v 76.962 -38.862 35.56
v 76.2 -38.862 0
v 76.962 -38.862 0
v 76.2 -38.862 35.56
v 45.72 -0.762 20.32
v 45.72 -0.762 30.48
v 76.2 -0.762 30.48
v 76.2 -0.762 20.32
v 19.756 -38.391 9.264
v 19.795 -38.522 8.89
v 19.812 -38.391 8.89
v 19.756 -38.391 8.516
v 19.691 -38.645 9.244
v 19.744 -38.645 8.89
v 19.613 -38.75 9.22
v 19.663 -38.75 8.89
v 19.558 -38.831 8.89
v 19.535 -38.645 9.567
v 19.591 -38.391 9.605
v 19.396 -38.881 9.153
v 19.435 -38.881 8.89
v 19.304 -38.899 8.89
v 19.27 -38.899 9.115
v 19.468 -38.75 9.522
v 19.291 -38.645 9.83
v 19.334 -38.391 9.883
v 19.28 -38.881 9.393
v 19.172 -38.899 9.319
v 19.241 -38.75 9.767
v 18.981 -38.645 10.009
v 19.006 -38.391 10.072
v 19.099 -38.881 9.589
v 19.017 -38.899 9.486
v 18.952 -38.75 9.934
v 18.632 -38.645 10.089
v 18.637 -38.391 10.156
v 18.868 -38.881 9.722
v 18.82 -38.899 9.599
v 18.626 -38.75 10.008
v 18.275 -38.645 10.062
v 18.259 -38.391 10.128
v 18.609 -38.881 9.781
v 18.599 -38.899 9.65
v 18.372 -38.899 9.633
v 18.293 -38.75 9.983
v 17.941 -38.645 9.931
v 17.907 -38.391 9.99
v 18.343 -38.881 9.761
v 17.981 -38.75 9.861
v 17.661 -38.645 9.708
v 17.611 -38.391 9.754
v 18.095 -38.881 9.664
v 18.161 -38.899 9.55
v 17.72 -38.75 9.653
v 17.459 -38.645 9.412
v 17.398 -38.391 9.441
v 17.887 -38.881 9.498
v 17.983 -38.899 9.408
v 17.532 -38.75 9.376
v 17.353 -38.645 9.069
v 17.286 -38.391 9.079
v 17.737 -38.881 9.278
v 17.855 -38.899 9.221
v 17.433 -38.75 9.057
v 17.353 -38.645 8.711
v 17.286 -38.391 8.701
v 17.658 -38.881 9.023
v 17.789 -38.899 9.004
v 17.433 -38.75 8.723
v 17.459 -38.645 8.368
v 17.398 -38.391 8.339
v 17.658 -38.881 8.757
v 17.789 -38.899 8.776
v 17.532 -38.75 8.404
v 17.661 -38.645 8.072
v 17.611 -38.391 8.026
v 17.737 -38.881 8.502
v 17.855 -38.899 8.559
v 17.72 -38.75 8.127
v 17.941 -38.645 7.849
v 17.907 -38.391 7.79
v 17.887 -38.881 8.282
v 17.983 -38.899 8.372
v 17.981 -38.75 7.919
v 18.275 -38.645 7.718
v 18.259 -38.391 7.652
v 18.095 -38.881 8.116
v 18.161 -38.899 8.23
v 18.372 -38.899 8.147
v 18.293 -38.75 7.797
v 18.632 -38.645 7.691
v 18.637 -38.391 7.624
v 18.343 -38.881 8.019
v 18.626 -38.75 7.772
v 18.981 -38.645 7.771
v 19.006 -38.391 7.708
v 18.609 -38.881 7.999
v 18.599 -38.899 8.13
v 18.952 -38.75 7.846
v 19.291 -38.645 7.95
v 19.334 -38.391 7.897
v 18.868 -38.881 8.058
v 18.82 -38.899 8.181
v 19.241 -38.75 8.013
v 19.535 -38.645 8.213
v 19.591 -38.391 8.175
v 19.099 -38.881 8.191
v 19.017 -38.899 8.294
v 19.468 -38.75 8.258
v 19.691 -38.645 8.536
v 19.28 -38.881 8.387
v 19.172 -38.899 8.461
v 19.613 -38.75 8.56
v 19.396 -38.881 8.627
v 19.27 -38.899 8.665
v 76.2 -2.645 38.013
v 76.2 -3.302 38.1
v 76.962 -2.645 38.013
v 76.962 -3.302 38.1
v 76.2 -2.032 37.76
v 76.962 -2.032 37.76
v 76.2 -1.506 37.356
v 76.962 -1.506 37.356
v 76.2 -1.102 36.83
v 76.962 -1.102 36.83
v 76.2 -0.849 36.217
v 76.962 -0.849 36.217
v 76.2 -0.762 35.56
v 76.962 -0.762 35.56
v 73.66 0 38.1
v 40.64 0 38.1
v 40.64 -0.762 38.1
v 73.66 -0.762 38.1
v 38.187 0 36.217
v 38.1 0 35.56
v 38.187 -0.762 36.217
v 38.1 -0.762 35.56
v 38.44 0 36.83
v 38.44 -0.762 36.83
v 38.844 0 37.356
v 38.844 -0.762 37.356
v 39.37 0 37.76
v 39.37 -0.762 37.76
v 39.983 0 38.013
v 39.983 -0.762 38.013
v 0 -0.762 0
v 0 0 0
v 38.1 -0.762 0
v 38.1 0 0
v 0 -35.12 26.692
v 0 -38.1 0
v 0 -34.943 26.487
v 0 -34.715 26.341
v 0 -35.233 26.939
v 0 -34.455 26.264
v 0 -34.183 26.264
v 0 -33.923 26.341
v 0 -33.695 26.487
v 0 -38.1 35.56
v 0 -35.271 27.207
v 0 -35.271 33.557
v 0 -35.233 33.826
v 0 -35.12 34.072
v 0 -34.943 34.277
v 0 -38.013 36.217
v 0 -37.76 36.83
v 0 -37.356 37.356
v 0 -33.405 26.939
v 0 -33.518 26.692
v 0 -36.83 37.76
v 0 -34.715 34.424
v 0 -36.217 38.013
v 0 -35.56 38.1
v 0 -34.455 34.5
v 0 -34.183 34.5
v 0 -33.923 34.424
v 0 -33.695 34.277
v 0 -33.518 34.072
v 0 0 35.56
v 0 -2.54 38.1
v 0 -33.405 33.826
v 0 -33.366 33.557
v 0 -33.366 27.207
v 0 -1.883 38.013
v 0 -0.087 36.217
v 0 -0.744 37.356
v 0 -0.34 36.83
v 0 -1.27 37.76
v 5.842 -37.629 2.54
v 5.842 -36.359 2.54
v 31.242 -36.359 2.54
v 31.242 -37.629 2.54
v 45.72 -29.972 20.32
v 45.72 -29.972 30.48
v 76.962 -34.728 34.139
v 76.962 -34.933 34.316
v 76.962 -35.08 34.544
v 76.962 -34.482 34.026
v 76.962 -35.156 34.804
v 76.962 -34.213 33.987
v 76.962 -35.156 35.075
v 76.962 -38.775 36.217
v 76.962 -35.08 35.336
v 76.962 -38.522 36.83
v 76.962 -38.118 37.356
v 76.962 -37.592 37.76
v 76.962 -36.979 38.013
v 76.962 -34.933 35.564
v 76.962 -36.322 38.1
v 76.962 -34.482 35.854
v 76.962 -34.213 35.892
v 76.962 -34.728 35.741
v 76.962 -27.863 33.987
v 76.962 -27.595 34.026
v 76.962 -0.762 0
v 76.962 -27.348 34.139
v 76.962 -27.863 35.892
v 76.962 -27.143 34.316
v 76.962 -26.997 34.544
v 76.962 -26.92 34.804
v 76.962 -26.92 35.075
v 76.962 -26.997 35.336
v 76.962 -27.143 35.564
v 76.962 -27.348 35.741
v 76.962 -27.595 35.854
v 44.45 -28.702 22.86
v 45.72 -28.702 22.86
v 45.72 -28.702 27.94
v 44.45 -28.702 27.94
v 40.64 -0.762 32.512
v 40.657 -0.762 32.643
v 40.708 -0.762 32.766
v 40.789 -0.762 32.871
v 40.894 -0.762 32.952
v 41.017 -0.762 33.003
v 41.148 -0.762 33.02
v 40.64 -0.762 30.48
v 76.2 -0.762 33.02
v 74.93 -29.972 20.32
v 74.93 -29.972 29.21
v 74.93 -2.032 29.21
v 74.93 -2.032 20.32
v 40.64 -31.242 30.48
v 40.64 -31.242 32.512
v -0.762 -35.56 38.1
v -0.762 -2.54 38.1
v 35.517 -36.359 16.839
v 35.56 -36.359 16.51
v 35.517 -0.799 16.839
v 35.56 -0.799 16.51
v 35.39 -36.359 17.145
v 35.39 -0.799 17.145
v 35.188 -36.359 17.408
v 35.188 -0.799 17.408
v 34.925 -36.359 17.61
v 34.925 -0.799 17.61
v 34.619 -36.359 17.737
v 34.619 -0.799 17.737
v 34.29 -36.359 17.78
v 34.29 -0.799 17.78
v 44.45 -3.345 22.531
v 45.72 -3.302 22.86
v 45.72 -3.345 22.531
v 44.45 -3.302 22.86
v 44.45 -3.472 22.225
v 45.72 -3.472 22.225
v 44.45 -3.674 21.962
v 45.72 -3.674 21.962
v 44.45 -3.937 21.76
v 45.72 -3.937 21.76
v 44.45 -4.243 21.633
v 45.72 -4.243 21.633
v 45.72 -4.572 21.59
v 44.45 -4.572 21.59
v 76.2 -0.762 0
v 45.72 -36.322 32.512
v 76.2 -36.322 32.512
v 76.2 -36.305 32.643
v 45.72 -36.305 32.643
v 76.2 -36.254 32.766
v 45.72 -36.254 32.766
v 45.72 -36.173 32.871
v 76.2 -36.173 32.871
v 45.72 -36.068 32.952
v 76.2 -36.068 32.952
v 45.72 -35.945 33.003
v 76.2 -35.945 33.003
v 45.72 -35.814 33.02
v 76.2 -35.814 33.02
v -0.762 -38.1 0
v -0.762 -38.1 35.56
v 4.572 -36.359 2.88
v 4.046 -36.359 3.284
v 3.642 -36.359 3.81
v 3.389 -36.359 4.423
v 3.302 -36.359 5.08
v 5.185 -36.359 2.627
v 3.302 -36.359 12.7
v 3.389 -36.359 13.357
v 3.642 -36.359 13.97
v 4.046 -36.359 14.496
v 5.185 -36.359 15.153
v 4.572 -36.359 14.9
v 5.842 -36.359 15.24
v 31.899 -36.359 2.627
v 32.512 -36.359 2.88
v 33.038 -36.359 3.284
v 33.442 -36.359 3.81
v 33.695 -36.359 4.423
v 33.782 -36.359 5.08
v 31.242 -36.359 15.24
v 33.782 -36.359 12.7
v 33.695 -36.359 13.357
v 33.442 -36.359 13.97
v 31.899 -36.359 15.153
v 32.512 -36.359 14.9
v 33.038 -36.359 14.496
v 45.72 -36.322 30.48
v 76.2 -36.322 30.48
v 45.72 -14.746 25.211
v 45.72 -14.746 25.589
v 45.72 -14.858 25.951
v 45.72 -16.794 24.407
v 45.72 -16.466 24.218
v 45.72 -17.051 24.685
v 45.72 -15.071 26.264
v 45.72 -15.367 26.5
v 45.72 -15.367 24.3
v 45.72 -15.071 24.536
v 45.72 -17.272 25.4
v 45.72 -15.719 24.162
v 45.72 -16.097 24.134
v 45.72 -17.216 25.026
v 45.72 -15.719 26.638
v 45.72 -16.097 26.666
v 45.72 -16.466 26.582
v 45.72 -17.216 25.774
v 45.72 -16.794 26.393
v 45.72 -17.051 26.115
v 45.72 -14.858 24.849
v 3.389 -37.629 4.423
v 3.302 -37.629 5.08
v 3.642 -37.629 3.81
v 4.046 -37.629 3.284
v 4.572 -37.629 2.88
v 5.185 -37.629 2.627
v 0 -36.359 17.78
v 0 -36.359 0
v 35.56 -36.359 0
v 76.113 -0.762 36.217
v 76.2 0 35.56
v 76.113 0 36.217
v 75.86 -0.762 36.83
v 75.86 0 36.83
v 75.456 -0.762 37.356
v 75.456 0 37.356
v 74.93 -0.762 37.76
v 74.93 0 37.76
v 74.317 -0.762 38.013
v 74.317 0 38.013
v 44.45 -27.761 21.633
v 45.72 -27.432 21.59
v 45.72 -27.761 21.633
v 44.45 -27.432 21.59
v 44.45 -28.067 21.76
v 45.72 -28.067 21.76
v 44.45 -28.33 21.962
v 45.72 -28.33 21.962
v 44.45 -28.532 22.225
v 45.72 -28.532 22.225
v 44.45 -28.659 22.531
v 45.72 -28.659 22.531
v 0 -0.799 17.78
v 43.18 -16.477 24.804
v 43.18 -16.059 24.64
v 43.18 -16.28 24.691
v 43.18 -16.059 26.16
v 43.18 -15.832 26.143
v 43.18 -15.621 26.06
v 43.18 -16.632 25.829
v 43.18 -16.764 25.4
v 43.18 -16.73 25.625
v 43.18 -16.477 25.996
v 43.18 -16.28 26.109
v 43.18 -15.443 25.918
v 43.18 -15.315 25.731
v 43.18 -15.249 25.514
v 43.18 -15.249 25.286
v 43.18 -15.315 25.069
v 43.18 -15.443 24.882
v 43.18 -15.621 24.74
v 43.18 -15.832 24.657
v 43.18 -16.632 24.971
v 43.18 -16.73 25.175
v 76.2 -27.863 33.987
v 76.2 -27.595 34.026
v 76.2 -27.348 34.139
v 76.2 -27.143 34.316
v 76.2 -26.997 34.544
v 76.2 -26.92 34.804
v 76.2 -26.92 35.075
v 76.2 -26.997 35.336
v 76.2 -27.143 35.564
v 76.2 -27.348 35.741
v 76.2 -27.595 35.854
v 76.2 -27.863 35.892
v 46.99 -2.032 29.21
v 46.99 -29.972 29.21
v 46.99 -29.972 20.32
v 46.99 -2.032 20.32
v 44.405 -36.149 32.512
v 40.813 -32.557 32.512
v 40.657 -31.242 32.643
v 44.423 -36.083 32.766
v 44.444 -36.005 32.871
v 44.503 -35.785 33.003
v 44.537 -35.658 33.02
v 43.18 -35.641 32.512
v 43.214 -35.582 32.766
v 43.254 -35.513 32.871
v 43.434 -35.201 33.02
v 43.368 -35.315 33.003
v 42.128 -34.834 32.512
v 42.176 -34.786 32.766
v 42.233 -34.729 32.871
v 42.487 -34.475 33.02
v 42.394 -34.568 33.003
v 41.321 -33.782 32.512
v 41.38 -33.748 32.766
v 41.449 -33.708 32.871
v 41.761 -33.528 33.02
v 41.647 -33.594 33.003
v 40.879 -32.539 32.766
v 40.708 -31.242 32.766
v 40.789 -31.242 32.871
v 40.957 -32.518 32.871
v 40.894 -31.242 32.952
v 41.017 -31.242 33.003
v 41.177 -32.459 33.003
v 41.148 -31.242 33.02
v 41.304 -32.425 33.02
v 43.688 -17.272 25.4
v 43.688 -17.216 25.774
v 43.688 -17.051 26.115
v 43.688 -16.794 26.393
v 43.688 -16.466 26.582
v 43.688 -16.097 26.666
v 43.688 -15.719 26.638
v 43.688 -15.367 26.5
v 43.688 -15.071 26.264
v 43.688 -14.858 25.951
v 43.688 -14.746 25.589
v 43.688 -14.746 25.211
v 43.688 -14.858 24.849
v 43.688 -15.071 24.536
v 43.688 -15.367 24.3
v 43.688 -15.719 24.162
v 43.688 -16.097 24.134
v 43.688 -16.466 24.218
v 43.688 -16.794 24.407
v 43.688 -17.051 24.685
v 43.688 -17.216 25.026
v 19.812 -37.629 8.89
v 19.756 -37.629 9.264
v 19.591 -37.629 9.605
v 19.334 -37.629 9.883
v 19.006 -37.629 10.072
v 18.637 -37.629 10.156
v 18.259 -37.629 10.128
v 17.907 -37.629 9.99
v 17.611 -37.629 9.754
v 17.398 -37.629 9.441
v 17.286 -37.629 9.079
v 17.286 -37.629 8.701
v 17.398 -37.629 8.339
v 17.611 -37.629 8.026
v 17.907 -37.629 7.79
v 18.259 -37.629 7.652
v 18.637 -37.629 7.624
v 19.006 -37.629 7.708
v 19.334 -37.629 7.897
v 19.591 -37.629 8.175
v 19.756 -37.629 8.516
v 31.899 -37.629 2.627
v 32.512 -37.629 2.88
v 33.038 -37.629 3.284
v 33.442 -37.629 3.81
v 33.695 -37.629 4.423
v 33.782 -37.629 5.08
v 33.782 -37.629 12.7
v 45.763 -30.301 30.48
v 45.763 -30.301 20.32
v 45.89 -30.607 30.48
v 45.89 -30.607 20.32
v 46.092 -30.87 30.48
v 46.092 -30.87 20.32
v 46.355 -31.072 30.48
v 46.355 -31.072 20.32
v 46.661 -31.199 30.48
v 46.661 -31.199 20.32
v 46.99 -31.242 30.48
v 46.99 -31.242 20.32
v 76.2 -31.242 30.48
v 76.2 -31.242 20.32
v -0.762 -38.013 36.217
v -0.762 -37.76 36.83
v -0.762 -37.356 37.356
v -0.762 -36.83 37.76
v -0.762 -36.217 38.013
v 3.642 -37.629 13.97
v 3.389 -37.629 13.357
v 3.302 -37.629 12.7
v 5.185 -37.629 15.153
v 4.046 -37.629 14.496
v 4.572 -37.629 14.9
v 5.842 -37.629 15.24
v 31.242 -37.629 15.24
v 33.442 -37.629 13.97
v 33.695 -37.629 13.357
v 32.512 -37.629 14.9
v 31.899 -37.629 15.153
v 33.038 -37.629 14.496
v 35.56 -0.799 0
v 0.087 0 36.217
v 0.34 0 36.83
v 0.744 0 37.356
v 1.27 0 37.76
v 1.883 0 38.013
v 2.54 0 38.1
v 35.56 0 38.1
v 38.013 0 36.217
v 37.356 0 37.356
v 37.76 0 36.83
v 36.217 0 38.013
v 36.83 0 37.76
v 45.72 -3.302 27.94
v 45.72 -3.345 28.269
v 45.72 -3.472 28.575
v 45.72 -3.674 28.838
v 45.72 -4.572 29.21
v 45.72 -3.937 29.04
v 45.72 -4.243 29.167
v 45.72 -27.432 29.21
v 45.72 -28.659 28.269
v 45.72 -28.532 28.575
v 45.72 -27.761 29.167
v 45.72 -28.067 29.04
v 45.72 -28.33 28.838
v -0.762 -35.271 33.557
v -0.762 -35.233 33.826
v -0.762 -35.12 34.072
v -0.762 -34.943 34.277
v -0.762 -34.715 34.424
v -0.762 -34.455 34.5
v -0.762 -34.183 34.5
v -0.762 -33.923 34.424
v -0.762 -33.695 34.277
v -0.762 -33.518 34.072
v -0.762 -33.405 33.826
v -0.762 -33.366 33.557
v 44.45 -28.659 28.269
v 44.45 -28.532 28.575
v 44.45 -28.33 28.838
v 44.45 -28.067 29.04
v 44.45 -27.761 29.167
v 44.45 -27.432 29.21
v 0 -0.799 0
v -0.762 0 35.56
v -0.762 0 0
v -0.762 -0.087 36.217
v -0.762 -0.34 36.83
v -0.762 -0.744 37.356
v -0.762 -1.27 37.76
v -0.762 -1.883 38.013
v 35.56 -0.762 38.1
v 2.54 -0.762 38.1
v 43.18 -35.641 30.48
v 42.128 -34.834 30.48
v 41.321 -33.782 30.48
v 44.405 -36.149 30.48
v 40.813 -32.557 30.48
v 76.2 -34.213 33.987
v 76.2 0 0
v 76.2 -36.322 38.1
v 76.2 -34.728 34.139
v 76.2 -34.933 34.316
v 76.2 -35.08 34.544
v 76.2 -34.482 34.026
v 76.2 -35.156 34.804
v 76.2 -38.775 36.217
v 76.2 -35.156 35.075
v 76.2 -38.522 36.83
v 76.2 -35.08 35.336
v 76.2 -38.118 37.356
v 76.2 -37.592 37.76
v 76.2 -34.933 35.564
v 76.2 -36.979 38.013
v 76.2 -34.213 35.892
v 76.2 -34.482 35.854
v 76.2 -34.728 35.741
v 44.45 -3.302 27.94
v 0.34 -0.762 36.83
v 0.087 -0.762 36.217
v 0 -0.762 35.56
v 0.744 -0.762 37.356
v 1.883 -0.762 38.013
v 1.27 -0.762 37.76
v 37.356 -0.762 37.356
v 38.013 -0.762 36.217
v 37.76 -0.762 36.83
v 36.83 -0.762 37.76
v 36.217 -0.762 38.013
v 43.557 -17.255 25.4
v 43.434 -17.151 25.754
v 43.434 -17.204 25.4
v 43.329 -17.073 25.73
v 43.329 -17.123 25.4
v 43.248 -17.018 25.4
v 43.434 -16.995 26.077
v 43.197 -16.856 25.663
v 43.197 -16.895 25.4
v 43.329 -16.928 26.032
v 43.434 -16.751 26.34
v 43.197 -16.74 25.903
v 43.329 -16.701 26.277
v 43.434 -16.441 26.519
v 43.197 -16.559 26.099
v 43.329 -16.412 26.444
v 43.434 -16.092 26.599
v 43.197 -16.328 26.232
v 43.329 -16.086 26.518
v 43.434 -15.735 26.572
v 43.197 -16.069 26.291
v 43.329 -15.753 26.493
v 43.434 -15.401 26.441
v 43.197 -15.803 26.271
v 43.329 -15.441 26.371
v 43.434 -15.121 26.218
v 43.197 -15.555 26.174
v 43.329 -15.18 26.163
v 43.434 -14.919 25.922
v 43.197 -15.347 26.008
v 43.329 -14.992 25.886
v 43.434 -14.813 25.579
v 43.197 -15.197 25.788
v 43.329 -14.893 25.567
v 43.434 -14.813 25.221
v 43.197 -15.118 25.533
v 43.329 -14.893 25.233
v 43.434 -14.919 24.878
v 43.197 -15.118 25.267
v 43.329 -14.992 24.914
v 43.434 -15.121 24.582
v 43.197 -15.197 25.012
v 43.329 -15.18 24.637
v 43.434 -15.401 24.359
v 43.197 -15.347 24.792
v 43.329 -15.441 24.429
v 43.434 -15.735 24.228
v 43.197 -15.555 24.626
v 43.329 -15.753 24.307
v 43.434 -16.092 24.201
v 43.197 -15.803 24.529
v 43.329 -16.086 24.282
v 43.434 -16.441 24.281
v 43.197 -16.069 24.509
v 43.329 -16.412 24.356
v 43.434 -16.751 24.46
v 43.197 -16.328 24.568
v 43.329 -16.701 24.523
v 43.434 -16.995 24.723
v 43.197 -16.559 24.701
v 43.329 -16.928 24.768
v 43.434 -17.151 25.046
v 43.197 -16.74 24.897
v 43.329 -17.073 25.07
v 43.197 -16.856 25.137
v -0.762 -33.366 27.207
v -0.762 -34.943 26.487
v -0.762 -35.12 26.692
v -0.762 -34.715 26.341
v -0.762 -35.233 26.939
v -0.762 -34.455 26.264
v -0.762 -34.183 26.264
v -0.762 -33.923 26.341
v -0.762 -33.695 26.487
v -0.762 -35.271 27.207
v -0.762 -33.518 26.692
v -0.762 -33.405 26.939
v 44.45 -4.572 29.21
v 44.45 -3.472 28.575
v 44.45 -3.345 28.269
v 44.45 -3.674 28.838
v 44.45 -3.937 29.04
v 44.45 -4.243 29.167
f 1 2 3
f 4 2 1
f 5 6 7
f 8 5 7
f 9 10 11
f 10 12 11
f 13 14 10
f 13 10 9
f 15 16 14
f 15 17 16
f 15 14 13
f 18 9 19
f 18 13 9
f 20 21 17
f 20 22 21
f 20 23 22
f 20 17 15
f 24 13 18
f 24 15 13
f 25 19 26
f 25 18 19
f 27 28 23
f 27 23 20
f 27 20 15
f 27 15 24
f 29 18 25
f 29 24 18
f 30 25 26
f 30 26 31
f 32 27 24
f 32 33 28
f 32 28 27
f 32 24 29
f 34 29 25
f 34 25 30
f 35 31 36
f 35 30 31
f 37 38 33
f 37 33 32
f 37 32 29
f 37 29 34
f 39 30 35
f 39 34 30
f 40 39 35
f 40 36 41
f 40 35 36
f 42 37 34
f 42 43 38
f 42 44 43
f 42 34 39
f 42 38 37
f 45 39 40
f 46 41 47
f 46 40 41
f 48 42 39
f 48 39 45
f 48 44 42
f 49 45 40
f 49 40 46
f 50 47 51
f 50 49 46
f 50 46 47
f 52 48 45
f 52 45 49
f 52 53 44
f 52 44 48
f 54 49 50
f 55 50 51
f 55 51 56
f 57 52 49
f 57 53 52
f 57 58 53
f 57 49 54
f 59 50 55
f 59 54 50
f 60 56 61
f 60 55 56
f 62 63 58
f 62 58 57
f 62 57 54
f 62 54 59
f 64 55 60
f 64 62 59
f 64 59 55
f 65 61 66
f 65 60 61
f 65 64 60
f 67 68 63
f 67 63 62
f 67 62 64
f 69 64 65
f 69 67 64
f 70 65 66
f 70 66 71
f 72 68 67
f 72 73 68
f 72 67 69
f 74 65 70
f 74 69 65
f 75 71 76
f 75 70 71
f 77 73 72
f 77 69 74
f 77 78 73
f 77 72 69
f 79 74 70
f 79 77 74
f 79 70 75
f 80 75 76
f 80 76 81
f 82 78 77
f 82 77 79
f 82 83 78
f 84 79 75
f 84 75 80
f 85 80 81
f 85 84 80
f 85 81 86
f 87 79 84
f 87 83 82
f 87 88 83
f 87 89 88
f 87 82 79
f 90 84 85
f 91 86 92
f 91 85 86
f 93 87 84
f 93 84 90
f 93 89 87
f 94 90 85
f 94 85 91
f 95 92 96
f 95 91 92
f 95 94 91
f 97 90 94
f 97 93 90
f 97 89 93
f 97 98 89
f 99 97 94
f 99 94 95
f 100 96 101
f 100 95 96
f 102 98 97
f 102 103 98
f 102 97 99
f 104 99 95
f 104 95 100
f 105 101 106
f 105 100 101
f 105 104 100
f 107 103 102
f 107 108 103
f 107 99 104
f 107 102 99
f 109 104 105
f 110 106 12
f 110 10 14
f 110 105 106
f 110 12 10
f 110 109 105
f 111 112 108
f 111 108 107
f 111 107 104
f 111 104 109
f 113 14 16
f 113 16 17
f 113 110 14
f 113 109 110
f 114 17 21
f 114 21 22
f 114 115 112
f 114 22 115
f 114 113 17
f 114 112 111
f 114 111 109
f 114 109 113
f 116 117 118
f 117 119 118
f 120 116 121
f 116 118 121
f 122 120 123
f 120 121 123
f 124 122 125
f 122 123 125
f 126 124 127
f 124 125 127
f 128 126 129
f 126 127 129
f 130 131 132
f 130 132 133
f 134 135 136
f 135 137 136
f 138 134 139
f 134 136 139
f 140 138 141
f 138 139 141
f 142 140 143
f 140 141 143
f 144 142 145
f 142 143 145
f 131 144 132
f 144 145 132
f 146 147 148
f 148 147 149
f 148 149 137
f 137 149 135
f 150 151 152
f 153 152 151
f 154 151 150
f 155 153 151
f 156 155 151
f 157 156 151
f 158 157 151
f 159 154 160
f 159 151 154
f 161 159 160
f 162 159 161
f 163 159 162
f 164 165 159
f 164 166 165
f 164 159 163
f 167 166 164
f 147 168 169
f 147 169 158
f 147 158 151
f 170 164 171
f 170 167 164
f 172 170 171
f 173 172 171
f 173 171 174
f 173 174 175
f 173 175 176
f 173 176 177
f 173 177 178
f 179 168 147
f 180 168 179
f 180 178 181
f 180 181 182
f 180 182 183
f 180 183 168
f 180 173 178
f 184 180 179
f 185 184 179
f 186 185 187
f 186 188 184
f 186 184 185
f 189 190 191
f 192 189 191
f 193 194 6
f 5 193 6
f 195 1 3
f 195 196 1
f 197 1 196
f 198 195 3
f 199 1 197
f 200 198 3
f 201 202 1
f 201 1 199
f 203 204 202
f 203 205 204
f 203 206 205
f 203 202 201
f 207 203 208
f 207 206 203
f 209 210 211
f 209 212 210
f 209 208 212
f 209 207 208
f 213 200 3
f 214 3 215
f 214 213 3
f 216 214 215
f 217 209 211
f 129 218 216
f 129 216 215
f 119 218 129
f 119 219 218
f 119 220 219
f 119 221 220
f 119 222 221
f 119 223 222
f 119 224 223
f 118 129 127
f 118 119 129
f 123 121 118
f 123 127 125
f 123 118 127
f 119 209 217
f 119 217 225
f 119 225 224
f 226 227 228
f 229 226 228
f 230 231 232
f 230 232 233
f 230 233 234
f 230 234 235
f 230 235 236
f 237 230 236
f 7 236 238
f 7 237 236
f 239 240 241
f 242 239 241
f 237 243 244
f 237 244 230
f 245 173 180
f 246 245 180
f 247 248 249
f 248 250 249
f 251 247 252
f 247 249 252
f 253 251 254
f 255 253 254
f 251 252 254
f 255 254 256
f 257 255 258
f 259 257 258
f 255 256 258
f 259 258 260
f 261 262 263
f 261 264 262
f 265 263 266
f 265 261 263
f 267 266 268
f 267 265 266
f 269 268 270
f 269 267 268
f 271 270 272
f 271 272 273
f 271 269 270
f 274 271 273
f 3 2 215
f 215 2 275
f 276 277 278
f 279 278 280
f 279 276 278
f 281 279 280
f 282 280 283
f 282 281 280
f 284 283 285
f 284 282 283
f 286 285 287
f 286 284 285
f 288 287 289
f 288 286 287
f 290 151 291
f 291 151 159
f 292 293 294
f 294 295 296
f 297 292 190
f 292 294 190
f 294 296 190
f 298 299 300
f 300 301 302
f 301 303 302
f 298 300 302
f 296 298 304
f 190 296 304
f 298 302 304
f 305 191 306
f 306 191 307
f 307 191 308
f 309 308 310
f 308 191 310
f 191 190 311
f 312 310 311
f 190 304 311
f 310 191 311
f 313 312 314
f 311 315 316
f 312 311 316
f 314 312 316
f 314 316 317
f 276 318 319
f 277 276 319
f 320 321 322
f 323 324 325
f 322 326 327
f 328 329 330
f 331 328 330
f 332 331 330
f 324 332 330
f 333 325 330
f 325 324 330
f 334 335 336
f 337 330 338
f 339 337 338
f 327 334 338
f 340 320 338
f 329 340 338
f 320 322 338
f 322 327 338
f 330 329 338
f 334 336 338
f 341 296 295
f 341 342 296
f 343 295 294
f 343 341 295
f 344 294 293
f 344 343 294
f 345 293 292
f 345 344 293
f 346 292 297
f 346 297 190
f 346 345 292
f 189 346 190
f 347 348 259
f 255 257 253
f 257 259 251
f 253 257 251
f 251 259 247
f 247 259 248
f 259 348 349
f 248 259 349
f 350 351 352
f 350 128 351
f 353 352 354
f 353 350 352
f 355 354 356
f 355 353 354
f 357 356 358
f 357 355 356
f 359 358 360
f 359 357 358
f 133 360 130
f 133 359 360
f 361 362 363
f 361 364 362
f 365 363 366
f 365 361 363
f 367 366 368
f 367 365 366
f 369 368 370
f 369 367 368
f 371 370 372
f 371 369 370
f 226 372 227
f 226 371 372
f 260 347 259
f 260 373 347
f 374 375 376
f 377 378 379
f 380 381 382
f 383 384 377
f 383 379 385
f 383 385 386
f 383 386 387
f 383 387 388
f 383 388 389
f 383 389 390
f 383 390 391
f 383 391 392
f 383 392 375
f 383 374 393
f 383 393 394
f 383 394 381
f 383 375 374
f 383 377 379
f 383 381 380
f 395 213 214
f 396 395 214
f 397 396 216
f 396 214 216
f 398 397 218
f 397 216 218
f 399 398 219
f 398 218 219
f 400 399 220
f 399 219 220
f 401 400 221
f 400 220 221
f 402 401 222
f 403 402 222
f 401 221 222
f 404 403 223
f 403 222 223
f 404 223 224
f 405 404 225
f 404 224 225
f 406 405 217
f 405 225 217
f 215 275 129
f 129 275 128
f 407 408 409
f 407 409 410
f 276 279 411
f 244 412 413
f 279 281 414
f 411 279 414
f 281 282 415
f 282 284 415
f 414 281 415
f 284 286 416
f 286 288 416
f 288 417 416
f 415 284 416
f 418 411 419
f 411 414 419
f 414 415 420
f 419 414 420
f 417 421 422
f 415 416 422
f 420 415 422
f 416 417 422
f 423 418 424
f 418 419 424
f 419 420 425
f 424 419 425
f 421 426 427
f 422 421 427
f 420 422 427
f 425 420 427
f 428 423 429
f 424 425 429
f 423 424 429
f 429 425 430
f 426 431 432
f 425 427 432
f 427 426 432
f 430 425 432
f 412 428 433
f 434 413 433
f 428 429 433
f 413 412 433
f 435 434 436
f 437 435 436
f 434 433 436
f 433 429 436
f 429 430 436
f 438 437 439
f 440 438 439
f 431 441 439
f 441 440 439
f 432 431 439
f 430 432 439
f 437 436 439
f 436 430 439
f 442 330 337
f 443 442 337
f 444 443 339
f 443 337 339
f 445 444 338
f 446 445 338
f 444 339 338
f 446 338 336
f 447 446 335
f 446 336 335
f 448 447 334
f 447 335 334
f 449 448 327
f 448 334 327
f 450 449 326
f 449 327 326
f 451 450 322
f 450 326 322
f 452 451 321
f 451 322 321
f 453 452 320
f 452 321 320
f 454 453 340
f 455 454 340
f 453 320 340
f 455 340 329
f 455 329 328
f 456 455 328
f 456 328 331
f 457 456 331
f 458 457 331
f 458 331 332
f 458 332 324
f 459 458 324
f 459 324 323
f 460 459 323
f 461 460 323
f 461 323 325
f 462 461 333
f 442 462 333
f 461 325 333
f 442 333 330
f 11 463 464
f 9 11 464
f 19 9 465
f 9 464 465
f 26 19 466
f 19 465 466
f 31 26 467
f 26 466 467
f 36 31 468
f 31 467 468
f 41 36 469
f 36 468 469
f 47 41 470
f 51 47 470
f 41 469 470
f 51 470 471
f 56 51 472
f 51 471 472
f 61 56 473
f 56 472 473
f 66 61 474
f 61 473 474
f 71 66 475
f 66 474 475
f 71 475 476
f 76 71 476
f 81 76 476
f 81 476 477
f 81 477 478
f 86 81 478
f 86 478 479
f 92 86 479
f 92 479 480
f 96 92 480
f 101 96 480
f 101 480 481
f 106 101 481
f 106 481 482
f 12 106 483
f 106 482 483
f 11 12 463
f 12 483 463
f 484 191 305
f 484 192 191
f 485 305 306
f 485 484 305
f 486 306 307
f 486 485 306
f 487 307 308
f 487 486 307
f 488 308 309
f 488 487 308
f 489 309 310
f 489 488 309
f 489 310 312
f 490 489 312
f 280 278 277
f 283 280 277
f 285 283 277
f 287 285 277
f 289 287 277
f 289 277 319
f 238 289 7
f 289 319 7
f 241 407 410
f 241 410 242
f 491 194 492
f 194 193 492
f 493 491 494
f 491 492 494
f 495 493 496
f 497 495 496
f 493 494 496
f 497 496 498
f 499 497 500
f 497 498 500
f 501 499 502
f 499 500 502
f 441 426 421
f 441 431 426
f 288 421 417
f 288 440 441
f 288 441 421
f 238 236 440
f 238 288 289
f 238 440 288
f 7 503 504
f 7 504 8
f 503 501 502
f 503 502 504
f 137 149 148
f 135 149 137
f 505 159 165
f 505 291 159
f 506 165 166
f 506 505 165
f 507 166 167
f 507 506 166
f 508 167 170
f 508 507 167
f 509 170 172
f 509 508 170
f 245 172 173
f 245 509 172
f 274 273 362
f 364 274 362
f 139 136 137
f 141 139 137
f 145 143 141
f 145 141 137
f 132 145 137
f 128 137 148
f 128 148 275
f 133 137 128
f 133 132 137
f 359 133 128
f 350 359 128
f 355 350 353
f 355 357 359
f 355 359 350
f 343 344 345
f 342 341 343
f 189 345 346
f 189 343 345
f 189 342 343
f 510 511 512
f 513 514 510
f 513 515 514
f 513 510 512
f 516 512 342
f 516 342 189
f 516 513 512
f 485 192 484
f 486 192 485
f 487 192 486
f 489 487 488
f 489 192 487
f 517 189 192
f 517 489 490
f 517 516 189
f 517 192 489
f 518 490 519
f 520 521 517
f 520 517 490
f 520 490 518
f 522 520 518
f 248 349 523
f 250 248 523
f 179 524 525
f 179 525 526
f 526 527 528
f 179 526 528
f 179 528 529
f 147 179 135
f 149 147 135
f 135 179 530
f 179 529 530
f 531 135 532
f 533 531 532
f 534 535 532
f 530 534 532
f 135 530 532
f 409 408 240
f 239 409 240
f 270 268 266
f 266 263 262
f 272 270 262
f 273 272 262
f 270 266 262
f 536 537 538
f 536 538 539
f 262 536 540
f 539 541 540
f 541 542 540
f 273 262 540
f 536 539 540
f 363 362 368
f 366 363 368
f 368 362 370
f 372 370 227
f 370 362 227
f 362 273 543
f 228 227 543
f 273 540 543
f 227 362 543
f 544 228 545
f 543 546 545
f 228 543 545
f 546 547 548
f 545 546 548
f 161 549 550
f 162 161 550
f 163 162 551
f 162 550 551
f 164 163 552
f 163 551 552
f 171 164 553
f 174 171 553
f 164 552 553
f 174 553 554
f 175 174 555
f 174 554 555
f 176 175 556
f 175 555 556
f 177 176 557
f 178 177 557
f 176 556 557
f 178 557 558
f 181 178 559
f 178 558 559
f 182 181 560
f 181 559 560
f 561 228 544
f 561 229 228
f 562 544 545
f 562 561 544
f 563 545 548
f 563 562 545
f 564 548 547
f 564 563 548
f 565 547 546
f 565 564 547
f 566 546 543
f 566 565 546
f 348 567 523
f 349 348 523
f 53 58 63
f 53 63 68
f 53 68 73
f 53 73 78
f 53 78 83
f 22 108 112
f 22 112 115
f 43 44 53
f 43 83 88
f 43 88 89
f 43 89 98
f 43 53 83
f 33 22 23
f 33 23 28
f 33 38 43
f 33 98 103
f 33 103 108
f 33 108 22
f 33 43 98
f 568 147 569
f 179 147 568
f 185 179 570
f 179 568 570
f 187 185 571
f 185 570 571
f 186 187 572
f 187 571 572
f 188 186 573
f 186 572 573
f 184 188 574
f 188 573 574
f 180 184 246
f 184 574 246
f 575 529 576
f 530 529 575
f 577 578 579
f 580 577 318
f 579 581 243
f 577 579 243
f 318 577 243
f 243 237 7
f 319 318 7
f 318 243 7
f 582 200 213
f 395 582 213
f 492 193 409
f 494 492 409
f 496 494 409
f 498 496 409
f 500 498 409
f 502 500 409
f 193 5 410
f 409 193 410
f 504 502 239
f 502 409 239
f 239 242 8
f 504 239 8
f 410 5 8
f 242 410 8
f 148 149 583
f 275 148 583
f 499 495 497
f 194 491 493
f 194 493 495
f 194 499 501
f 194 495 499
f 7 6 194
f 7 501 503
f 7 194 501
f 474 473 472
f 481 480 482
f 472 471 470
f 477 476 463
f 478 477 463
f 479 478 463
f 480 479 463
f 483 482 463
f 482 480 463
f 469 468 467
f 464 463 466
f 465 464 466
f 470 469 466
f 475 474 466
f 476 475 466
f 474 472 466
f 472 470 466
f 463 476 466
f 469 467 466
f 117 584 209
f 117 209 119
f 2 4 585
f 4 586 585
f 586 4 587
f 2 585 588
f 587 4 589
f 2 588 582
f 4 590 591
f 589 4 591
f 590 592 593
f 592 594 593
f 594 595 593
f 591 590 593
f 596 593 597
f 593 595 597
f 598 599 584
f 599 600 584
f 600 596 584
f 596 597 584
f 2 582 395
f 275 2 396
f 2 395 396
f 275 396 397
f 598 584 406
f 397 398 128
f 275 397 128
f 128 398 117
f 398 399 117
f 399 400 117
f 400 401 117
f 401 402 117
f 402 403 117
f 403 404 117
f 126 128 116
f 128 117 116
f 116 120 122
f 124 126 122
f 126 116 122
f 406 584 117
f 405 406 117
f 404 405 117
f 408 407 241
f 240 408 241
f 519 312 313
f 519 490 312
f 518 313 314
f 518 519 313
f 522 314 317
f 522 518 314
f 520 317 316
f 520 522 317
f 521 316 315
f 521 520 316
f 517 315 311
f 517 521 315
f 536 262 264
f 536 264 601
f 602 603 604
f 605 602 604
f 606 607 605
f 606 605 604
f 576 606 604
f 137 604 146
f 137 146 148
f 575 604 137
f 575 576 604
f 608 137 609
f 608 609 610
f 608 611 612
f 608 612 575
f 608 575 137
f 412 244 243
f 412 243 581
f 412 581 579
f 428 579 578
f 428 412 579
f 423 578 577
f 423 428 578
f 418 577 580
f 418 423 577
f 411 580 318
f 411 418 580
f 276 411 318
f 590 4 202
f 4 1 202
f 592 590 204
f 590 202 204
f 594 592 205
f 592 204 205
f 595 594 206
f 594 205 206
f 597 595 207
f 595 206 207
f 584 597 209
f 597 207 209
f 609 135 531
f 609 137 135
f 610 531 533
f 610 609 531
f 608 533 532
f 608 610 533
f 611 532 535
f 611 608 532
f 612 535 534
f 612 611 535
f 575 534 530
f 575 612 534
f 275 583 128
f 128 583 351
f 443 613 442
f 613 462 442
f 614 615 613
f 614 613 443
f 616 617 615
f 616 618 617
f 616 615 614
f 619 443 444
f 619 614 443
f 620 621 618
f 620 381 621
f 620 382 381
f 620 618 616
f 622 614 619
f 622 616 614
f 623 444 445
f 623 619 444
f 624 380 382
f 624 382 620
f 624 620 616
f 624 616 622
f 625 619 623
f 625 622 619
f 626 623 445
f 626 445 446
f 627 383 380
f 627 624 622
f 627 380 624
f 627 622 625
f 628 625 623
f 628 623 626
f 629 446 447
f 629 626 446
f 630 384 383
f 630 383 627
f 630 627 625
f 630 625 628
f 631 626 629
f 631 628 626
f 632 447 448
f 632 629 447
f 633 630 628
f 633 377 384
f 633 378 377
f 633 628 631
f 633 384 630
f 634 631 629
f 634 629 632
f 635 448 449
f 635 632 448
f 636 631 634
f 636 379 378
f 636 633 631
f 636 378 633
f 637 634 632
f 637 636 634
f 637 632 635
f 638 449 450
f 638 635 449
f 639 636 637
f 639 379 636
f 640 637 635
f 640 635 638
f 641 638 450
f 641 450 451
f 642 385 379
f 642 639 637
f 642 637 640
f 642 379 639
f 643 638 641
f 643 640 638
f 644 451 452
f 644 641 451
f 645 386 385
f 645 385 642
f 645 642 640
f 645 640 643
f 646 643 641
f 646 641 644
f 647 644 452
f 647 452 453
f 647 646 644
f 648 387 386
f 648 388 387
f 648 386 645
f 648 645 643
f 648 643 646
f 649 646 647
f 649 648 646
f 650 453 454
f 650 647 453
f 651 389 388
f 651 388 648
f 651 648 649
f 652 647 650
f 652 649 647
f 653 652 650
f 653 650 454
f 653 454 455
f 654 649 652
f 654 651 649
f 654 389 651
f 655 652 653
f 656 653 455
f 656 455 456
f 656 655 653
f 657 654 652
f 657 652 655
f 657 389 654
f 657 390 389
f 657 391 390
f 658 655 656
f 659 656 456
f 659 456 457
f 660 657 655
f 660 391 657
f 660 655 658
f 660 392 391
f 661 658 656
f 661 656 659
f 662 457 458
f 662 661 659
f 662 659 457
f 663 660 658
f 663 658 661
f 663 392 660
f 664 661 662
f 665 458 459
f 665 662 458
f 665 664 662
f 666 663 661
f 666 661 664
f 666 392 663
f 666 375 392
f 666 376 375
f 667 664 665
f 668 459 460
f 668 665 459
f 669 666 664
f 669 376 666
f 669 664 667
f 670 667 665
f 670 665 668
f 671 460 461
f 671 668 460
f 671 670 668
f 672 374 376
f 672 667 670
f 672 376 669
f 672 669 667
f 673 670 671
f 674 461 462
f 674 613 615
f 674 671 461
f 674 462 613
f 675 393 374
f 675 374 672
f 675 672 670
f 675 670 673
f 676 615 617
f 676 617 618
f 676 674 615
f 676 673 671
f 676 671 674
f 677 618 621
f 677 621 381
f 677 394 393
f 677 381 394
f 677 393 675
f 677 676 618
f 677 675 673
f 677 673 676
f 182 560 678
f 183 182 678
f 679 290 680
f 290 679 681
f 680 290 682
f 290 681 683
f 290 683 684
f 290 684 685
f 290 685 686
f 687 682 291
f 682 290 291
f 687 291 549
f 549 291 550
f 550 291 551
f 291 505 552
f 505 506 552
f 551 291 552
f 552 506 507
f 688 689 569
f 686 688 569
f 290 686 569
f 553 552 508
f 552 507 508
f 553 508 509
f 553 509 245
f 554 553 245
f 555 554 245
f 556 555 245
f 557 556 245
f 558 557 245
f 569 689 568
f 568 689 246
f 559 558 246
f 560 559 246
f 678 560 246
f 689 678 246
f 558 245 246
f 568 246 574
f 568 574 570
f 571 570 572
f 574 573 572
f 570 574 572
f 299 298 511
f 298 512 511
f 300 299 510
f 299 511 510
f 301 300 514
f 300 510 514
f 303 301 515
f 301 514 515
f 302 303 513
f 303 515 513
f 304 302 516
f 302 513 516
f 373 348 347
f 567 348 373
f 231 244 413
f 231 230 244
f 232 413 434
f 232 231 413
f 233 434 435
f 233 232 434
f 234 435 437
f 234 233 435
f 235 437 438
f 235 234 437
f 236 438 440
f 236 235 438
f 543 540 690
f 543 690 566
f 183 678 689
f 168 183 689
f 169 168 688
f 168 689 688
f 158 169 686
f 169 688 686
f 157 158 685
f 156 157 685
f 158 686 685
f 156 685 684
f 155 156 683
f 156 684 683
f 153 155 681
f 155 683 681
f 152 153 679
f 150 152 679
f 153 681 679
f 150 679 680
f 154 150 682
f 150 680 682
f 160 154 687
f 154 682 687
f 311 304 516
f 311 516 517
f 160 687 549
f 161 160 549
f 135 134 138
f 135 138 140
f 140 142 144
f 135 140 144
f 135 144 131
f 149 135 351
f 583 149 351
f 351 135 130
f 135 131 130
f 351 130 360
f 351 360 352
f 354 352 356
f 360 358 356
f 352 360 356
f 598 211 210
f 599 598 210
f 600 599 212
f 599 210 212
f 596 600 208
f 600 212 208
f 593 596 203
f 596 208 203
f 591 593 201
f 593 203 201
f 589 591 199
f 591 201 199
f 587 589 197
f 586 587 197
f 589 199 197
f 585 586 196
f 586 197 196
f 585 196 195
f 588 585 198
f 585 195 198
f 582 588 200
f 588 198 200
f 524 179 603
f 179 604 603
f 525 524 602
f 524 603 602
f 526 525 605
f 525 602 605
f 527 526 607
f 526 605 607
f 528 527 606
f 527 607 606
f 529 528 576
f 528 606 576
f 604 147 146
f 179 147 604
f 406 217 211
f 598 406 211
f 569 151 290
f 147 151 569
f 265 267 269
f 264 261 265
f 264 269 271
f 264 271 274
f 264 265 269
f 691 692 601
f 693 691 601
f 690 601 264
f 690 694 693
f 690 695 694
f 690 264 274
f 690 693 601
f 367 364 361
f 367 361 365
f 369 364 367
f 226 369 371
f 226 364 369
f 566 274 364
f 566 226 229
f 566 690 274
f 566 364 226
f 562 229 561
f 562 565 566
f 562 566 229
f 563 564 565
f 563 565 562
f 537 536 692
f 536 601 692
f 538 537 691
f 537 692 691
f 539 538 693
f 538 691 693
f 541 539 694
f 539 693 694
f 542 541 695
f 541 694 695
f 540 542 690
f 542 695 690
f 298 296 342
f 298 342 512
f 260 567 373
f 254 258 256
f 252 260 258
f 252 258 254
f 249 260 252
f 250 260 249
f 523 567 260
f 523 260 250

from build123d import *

# Parameters (mm, degrees)
F0_W      = 38.1
F0_H      = 38.1
F2_DEPTH  = 0.762
F1_W      = 38.1
F1_H      = 38.1
F3_DEPTH  = 0.762
F4_W      = 35.56
F4_H      = 35.56
F5_DEPTH  = 17.78
F8_W      = 30.48
F8_H      = 30.48
F9_DEPTH  = 10.16
F7_W      = 35.56
F7_H      = 35.56
F10_DEPTH = 2.54
F11_W     = 30.48
F11_H     = 12.7
F12_DEPTH = 1.27
F13_R     = 1.27
F14_DEPTH = 1.27
F16_R     = 1.27
F17_DEPTH = 2.54
F15_W     = 25.4
F15_H     = 7.62
F18_DEPTH = 1.27
F19_R     = 2.54
F19_2_R   = 2.54
F19_3_R   = 2.54
F20_R     = 5.08
F21_R     = 1.27
F21_2_R   = 1.27
F23_DEPTH = 12.7
F24_DEPTH = 0.762
F26_W     = 38.1
F26_H     = 38.1
F27_DEPTH = 0.762
F29_DEPTH = 12.7
F30_R     = 2.54
F30_2_R   = 2.54
F31_T     = 1.27
F33_DEPTH = 25.4
F34_R     = 0.508
F35_R     = 0.508
F36_R     = 0.508
F38_R     = 1.27


# Not quite as in the source:
# - two fillets or chamfers of one size are made in one step
# - a shell that OpenCascade refuses in one call is made with other operations: the cavity is built on its own and cut out
# - a feature names something its author has since deleted; it is built from what else it names


with BuildPart() as f2:
    # F0 (on Right) → F2 (new body)
    with BuildSketch(Plane.YZ):
        with Locations((-19.05, 19.05)):
            Rectangle(F0_W, F0_H)
    extrude(amount=-F2_DEPTH)

    # F19
    f19_edges = [f2.edges().sort_by_distance(p)[0] for p in [
        (-0.381, -38.1, 38.1),
        (-0.381, 0, 38.1),
    ]]
    fillet(f19_edges, radius=F19_R)

    # F22 (on face) → F23 (cut)
    with BuildSketch(Plane.YZ):
        with BuildLine():
            ThreePointArc((35.283215344, 34.4806989491), (34.330715344, 35.4331989491), (33.378215344, 34.4806989491))
            Line((33.378215344, 34.4806989491), (33.378215344, 28.1306989491))
            ThreePointArc((33.378215344, 28.1306989491), (34.330715344, 27.1781989491), (35.283215344, 28.1306989491))
            Line((35.283215344, 28.1306989491), (35.283215344, 34.4806989491))
        make_face()
    extrude(amount=-F23_DEPTH, mode=Mode.SUBTRACT)

    # F32 (on face) → F33 (cut)
    with BuildSketch(Plane(origin=(-0.762, 0, 0), x_dir=(0, -1, 0), z_dir=(-1, 0, 0))):
        with BuildLine():
            ThreePointArc((35.2714537645, 33.5571871057), (34.3189537645, 34.5096871057), (33.3664537645, 33.5571871057))
            Line((33.3664537645, 33.5571871057), (33.3664537645, 27.2071871057))
            ThreePointArc((33.3664537645, 27.2071871057), (34.3189537645, 26.2546871057), (35.2714537645, 27.2071871057))
            Line((35.2714537645, 27.2071871057), (35.2714537645, 33.5571871057))
        make_face()
    extrude(amount=-F33_DEPTH, mode=Mode.SUBTRACT)


with BuildPart() as f3:
    # F1 (on Front) → F3 (new body)
    with BuildSketch(Plane.XZ):
        with Locations((19.05, 19.05)):
            Rectangle(F1_W, F1_H)
    extrude(amount=F3_DEPTH)

    # F19#2
    f19_2_edges = [f3.edges().sort_by_distance(p)[0] for p in [
        (0, -0.381, 38.1),
        (38.1, -0.381, 38.1),
    ]]
    fillet(f19_2_edges, radius=F19_2_R)


with BuildPart() as f5:
    # F4 (on Top) → F5 (new body)
    with BuildSketch(Plane.XY):
        with Locations((17.78, -18.5785688174)):
            Rectangle(F4_W, F4_H)
    extrude(amount=F5_DEPTH)

    # F21
    f21_edges = [f5.edges().sort_by_distance(p)[0] for p in [
        (35.56, -18.578569, 17.78),
    ]]
    fillet(f21_edges, radius=F21_R)


with BuildPart() as f9:
    # F8 (on offset) → F9 (new body)
    with BuildSketch(Plane.XY.offset(30.48)):
        with Locations((60.96, -16.002)):
            Rectangle(F8_W, F8_H)
    extrude(amount=-F9_DEPTH)

    # F21#2
    f21_2_edges = [f9.edges().sort_by_distance(p)[0] for p in [
        (45.72, -31.242, 25.4),
    ]]
    fillet(f21_2_edges, radius=F21_2_R)

    # F31: shell of thickness 1.27, made by hand


with BuildPart() as f10:
    # F7 (on offset) → F10 (new body)
    with BuildSketch(Plane.XY.offset(30.48)):
        with Locations((58.42, -18.542)):
            Rectangle(F7_W, F7_H)
    extrude(amount=F10_DEPTH)

    # F20
    f20_edges = [f10.edges().sort_by_distance(p)[0] for p in [
        (40.64, -36.322, 31.75),
    ]]
    fillet(f20_edges, radius=F20_R)

    # F34
    f34_edges = [f10.edges().sort_by_distance(p)[0] for p in [
        (40.64, -16.002, 33.02),
    ]]
    fillet(f34_edges, radius=F34_R)


with BuildPart() as f12:
    # F11 (on face) → F12 (new body)
    with BuildSketch(Plane.XZ.offset(36.3585688174)):
        with Locations((18.542, 8.89)):
            Rectangle(F11_W, F11_H)
    extrude(amount=F12_DEPTH)

    # F19#3
    f19_3_edges = [f12.edges().sort_by_distance(p)[0] for p in [
        (3.302, -36.993569, 2.54),
        (33.782, -36.993569, 2.54),
        (33.782, -36.993569, 15.24),
        (3.302, -36.993569, 15.24),
    ]]
    fillet(f19_3_edges, radius=F19_3_R)


with BuildPart() as f14:
    # F13 (on face) → F14 (new body)
    with BuildSketch(Plane.XZ.offset(37.6285688174)):
        with Locations((18.542, 8.89)):
            Circle(F13_R)
    extrude(amount=F14_DEPTH)

    # F35
    f35_edges = [f14.edges().sort_by_distance(p)[0] for p in [
        (17.272, -38.898569, 8.89),
    ]]
    fillet(f35_edges, radius=F35_R)


with BuildPart() as f17:
    # F16 (on face) → F17 (new body)
    with BuildSketch(Plane(origin=(45.72, 0, 0), x_dir=(0, -1, 0), z_dir=(-1, 0, 0))):
        with Locations((16.002, 25.4)):
            Circle(F16_R)
    extrude(amount=F17_DEPTH)

    # F36
    f36_edges = [f17.edges().sort_by_distance(p)[0] for p in [
        (43.18, -14.732, 25.4),
    ]]
    fillet(f36_edges, radius=F36_R)


with BuildPart() as f18:
    # F15 (on face) → F18 (new body)
    with BuildSketch(Plane(origin=(45.72, 0, 0), x_dir=(0, -1, 0), z_dir=(-1, 0, 0))):
        with Locations((16.002, 25.4)):
            Rectangle(F15_W, F15_H)
    extrude(amount=F18_DEPTH)

    # F38
    f38_edges = [f18.edges().sort_by_distance(p)[0] for p in [
        (45.085, -28.702, 21.59),
        (45.085, -28.702, 29.21),
        (45.085, -3.302, 21.59),
        (45.085, -3.302, 29.21),
    ]]
    fillet(f38_edges, radius=F38_R)


with BuildPart() as f24:
    # F1 (on Front) → F24 (new body)
    with BuildSketch(Plane.XZ):
        with Locations((57.15, 19.05)):
            Rectangle(F1_W, F1_H)
    extrude(amount=F24_DEPTH)

    # F30
    f30_edges = [f24.edges().sort_by_distance(p)[0] for p in [
        (76.2, -0.381, 38.1),
        (38.1, -0.381, 38.1),
    ]]
    fillet(f30_edges, radius=F30_R)


with BuildPart() as f27:
    # F26 (on offset) → F27 (new body)
    with BuildSketch(Plane.YZ.offset(76.2)):
        with Locations((-19.812, 19.05)):
            Rectangle(F26_W, F26_H)
    extrude(amount=F27_DEPTH)

    # F28 (on face) → F29 (cut)
    with BuildSketch(Plane.YZ.offset(76.962)):
        with BuildLine():
            Line((-27.8631728142, 35.8923991907), (-34.2131728142, 35.8923991907))
            ThreePointArc((-34.2131728142, 35.8923991907), (-35.1656728142, 34.9398991907), (-34.2131728142, 33.9873991907))
            Line((-34.2131728142, 33.9873991907), (-27.8631728142, 33.9873991907))
            ThreePointArc((-27.8631728142, 33.9873991907), (-26.9106728142, 34.9398991907), (-27.8631728142, 35.8923991907))
        make_face()
    extrude(amount=-F29_DEPTH, mode=Mode.SUBTRACT)

    # F30#2
    f30_2_edges = [f27.edges().sort_by_distance(p)[0] for p in [
        (76.581, -0.762, 38.1),
        (76.581, -38.862, 38.1),
    ]]
    fillet(f30_2_edges, radius=F30_2_R)


with BuildPart() as f31_core1:
    # F31_t2: copy of F9
    add(f9.part)

    # the walls: a layer under each face that stays
    f31_faces = [f31_core1.faces().sort_by_distance(p)[0] for p in [
        (45.72, -15.367, 25.4),
        (60.96, -16.002, 30.48),
        (60.96, -0.762, 25.4),
        (61.595, -31.242, 25.4),
        (76.2, -16.002, 25.4),
    ]]
    thicken(f31_faces, amount=-F31_T, mode=Mode.SUBTRACT)


with BuildPart() as f9_1:
    add(f9.part)

    # what is left inside the walls is the cavity
    f31_cavity = [f31_core1.part.solids().sort_by_distance(p)[0] for p in [
        (60.96, -20.658667, 20.3327),
    ]]
    add(f31_cavity, mode=Mode.SUBTRACT)


solid = Compound([f2.part, f3.part, f5.part, f10.part, f12.part, f14.part, f17.part, f18.part, f24.part, f27.part, f9_1.part])
